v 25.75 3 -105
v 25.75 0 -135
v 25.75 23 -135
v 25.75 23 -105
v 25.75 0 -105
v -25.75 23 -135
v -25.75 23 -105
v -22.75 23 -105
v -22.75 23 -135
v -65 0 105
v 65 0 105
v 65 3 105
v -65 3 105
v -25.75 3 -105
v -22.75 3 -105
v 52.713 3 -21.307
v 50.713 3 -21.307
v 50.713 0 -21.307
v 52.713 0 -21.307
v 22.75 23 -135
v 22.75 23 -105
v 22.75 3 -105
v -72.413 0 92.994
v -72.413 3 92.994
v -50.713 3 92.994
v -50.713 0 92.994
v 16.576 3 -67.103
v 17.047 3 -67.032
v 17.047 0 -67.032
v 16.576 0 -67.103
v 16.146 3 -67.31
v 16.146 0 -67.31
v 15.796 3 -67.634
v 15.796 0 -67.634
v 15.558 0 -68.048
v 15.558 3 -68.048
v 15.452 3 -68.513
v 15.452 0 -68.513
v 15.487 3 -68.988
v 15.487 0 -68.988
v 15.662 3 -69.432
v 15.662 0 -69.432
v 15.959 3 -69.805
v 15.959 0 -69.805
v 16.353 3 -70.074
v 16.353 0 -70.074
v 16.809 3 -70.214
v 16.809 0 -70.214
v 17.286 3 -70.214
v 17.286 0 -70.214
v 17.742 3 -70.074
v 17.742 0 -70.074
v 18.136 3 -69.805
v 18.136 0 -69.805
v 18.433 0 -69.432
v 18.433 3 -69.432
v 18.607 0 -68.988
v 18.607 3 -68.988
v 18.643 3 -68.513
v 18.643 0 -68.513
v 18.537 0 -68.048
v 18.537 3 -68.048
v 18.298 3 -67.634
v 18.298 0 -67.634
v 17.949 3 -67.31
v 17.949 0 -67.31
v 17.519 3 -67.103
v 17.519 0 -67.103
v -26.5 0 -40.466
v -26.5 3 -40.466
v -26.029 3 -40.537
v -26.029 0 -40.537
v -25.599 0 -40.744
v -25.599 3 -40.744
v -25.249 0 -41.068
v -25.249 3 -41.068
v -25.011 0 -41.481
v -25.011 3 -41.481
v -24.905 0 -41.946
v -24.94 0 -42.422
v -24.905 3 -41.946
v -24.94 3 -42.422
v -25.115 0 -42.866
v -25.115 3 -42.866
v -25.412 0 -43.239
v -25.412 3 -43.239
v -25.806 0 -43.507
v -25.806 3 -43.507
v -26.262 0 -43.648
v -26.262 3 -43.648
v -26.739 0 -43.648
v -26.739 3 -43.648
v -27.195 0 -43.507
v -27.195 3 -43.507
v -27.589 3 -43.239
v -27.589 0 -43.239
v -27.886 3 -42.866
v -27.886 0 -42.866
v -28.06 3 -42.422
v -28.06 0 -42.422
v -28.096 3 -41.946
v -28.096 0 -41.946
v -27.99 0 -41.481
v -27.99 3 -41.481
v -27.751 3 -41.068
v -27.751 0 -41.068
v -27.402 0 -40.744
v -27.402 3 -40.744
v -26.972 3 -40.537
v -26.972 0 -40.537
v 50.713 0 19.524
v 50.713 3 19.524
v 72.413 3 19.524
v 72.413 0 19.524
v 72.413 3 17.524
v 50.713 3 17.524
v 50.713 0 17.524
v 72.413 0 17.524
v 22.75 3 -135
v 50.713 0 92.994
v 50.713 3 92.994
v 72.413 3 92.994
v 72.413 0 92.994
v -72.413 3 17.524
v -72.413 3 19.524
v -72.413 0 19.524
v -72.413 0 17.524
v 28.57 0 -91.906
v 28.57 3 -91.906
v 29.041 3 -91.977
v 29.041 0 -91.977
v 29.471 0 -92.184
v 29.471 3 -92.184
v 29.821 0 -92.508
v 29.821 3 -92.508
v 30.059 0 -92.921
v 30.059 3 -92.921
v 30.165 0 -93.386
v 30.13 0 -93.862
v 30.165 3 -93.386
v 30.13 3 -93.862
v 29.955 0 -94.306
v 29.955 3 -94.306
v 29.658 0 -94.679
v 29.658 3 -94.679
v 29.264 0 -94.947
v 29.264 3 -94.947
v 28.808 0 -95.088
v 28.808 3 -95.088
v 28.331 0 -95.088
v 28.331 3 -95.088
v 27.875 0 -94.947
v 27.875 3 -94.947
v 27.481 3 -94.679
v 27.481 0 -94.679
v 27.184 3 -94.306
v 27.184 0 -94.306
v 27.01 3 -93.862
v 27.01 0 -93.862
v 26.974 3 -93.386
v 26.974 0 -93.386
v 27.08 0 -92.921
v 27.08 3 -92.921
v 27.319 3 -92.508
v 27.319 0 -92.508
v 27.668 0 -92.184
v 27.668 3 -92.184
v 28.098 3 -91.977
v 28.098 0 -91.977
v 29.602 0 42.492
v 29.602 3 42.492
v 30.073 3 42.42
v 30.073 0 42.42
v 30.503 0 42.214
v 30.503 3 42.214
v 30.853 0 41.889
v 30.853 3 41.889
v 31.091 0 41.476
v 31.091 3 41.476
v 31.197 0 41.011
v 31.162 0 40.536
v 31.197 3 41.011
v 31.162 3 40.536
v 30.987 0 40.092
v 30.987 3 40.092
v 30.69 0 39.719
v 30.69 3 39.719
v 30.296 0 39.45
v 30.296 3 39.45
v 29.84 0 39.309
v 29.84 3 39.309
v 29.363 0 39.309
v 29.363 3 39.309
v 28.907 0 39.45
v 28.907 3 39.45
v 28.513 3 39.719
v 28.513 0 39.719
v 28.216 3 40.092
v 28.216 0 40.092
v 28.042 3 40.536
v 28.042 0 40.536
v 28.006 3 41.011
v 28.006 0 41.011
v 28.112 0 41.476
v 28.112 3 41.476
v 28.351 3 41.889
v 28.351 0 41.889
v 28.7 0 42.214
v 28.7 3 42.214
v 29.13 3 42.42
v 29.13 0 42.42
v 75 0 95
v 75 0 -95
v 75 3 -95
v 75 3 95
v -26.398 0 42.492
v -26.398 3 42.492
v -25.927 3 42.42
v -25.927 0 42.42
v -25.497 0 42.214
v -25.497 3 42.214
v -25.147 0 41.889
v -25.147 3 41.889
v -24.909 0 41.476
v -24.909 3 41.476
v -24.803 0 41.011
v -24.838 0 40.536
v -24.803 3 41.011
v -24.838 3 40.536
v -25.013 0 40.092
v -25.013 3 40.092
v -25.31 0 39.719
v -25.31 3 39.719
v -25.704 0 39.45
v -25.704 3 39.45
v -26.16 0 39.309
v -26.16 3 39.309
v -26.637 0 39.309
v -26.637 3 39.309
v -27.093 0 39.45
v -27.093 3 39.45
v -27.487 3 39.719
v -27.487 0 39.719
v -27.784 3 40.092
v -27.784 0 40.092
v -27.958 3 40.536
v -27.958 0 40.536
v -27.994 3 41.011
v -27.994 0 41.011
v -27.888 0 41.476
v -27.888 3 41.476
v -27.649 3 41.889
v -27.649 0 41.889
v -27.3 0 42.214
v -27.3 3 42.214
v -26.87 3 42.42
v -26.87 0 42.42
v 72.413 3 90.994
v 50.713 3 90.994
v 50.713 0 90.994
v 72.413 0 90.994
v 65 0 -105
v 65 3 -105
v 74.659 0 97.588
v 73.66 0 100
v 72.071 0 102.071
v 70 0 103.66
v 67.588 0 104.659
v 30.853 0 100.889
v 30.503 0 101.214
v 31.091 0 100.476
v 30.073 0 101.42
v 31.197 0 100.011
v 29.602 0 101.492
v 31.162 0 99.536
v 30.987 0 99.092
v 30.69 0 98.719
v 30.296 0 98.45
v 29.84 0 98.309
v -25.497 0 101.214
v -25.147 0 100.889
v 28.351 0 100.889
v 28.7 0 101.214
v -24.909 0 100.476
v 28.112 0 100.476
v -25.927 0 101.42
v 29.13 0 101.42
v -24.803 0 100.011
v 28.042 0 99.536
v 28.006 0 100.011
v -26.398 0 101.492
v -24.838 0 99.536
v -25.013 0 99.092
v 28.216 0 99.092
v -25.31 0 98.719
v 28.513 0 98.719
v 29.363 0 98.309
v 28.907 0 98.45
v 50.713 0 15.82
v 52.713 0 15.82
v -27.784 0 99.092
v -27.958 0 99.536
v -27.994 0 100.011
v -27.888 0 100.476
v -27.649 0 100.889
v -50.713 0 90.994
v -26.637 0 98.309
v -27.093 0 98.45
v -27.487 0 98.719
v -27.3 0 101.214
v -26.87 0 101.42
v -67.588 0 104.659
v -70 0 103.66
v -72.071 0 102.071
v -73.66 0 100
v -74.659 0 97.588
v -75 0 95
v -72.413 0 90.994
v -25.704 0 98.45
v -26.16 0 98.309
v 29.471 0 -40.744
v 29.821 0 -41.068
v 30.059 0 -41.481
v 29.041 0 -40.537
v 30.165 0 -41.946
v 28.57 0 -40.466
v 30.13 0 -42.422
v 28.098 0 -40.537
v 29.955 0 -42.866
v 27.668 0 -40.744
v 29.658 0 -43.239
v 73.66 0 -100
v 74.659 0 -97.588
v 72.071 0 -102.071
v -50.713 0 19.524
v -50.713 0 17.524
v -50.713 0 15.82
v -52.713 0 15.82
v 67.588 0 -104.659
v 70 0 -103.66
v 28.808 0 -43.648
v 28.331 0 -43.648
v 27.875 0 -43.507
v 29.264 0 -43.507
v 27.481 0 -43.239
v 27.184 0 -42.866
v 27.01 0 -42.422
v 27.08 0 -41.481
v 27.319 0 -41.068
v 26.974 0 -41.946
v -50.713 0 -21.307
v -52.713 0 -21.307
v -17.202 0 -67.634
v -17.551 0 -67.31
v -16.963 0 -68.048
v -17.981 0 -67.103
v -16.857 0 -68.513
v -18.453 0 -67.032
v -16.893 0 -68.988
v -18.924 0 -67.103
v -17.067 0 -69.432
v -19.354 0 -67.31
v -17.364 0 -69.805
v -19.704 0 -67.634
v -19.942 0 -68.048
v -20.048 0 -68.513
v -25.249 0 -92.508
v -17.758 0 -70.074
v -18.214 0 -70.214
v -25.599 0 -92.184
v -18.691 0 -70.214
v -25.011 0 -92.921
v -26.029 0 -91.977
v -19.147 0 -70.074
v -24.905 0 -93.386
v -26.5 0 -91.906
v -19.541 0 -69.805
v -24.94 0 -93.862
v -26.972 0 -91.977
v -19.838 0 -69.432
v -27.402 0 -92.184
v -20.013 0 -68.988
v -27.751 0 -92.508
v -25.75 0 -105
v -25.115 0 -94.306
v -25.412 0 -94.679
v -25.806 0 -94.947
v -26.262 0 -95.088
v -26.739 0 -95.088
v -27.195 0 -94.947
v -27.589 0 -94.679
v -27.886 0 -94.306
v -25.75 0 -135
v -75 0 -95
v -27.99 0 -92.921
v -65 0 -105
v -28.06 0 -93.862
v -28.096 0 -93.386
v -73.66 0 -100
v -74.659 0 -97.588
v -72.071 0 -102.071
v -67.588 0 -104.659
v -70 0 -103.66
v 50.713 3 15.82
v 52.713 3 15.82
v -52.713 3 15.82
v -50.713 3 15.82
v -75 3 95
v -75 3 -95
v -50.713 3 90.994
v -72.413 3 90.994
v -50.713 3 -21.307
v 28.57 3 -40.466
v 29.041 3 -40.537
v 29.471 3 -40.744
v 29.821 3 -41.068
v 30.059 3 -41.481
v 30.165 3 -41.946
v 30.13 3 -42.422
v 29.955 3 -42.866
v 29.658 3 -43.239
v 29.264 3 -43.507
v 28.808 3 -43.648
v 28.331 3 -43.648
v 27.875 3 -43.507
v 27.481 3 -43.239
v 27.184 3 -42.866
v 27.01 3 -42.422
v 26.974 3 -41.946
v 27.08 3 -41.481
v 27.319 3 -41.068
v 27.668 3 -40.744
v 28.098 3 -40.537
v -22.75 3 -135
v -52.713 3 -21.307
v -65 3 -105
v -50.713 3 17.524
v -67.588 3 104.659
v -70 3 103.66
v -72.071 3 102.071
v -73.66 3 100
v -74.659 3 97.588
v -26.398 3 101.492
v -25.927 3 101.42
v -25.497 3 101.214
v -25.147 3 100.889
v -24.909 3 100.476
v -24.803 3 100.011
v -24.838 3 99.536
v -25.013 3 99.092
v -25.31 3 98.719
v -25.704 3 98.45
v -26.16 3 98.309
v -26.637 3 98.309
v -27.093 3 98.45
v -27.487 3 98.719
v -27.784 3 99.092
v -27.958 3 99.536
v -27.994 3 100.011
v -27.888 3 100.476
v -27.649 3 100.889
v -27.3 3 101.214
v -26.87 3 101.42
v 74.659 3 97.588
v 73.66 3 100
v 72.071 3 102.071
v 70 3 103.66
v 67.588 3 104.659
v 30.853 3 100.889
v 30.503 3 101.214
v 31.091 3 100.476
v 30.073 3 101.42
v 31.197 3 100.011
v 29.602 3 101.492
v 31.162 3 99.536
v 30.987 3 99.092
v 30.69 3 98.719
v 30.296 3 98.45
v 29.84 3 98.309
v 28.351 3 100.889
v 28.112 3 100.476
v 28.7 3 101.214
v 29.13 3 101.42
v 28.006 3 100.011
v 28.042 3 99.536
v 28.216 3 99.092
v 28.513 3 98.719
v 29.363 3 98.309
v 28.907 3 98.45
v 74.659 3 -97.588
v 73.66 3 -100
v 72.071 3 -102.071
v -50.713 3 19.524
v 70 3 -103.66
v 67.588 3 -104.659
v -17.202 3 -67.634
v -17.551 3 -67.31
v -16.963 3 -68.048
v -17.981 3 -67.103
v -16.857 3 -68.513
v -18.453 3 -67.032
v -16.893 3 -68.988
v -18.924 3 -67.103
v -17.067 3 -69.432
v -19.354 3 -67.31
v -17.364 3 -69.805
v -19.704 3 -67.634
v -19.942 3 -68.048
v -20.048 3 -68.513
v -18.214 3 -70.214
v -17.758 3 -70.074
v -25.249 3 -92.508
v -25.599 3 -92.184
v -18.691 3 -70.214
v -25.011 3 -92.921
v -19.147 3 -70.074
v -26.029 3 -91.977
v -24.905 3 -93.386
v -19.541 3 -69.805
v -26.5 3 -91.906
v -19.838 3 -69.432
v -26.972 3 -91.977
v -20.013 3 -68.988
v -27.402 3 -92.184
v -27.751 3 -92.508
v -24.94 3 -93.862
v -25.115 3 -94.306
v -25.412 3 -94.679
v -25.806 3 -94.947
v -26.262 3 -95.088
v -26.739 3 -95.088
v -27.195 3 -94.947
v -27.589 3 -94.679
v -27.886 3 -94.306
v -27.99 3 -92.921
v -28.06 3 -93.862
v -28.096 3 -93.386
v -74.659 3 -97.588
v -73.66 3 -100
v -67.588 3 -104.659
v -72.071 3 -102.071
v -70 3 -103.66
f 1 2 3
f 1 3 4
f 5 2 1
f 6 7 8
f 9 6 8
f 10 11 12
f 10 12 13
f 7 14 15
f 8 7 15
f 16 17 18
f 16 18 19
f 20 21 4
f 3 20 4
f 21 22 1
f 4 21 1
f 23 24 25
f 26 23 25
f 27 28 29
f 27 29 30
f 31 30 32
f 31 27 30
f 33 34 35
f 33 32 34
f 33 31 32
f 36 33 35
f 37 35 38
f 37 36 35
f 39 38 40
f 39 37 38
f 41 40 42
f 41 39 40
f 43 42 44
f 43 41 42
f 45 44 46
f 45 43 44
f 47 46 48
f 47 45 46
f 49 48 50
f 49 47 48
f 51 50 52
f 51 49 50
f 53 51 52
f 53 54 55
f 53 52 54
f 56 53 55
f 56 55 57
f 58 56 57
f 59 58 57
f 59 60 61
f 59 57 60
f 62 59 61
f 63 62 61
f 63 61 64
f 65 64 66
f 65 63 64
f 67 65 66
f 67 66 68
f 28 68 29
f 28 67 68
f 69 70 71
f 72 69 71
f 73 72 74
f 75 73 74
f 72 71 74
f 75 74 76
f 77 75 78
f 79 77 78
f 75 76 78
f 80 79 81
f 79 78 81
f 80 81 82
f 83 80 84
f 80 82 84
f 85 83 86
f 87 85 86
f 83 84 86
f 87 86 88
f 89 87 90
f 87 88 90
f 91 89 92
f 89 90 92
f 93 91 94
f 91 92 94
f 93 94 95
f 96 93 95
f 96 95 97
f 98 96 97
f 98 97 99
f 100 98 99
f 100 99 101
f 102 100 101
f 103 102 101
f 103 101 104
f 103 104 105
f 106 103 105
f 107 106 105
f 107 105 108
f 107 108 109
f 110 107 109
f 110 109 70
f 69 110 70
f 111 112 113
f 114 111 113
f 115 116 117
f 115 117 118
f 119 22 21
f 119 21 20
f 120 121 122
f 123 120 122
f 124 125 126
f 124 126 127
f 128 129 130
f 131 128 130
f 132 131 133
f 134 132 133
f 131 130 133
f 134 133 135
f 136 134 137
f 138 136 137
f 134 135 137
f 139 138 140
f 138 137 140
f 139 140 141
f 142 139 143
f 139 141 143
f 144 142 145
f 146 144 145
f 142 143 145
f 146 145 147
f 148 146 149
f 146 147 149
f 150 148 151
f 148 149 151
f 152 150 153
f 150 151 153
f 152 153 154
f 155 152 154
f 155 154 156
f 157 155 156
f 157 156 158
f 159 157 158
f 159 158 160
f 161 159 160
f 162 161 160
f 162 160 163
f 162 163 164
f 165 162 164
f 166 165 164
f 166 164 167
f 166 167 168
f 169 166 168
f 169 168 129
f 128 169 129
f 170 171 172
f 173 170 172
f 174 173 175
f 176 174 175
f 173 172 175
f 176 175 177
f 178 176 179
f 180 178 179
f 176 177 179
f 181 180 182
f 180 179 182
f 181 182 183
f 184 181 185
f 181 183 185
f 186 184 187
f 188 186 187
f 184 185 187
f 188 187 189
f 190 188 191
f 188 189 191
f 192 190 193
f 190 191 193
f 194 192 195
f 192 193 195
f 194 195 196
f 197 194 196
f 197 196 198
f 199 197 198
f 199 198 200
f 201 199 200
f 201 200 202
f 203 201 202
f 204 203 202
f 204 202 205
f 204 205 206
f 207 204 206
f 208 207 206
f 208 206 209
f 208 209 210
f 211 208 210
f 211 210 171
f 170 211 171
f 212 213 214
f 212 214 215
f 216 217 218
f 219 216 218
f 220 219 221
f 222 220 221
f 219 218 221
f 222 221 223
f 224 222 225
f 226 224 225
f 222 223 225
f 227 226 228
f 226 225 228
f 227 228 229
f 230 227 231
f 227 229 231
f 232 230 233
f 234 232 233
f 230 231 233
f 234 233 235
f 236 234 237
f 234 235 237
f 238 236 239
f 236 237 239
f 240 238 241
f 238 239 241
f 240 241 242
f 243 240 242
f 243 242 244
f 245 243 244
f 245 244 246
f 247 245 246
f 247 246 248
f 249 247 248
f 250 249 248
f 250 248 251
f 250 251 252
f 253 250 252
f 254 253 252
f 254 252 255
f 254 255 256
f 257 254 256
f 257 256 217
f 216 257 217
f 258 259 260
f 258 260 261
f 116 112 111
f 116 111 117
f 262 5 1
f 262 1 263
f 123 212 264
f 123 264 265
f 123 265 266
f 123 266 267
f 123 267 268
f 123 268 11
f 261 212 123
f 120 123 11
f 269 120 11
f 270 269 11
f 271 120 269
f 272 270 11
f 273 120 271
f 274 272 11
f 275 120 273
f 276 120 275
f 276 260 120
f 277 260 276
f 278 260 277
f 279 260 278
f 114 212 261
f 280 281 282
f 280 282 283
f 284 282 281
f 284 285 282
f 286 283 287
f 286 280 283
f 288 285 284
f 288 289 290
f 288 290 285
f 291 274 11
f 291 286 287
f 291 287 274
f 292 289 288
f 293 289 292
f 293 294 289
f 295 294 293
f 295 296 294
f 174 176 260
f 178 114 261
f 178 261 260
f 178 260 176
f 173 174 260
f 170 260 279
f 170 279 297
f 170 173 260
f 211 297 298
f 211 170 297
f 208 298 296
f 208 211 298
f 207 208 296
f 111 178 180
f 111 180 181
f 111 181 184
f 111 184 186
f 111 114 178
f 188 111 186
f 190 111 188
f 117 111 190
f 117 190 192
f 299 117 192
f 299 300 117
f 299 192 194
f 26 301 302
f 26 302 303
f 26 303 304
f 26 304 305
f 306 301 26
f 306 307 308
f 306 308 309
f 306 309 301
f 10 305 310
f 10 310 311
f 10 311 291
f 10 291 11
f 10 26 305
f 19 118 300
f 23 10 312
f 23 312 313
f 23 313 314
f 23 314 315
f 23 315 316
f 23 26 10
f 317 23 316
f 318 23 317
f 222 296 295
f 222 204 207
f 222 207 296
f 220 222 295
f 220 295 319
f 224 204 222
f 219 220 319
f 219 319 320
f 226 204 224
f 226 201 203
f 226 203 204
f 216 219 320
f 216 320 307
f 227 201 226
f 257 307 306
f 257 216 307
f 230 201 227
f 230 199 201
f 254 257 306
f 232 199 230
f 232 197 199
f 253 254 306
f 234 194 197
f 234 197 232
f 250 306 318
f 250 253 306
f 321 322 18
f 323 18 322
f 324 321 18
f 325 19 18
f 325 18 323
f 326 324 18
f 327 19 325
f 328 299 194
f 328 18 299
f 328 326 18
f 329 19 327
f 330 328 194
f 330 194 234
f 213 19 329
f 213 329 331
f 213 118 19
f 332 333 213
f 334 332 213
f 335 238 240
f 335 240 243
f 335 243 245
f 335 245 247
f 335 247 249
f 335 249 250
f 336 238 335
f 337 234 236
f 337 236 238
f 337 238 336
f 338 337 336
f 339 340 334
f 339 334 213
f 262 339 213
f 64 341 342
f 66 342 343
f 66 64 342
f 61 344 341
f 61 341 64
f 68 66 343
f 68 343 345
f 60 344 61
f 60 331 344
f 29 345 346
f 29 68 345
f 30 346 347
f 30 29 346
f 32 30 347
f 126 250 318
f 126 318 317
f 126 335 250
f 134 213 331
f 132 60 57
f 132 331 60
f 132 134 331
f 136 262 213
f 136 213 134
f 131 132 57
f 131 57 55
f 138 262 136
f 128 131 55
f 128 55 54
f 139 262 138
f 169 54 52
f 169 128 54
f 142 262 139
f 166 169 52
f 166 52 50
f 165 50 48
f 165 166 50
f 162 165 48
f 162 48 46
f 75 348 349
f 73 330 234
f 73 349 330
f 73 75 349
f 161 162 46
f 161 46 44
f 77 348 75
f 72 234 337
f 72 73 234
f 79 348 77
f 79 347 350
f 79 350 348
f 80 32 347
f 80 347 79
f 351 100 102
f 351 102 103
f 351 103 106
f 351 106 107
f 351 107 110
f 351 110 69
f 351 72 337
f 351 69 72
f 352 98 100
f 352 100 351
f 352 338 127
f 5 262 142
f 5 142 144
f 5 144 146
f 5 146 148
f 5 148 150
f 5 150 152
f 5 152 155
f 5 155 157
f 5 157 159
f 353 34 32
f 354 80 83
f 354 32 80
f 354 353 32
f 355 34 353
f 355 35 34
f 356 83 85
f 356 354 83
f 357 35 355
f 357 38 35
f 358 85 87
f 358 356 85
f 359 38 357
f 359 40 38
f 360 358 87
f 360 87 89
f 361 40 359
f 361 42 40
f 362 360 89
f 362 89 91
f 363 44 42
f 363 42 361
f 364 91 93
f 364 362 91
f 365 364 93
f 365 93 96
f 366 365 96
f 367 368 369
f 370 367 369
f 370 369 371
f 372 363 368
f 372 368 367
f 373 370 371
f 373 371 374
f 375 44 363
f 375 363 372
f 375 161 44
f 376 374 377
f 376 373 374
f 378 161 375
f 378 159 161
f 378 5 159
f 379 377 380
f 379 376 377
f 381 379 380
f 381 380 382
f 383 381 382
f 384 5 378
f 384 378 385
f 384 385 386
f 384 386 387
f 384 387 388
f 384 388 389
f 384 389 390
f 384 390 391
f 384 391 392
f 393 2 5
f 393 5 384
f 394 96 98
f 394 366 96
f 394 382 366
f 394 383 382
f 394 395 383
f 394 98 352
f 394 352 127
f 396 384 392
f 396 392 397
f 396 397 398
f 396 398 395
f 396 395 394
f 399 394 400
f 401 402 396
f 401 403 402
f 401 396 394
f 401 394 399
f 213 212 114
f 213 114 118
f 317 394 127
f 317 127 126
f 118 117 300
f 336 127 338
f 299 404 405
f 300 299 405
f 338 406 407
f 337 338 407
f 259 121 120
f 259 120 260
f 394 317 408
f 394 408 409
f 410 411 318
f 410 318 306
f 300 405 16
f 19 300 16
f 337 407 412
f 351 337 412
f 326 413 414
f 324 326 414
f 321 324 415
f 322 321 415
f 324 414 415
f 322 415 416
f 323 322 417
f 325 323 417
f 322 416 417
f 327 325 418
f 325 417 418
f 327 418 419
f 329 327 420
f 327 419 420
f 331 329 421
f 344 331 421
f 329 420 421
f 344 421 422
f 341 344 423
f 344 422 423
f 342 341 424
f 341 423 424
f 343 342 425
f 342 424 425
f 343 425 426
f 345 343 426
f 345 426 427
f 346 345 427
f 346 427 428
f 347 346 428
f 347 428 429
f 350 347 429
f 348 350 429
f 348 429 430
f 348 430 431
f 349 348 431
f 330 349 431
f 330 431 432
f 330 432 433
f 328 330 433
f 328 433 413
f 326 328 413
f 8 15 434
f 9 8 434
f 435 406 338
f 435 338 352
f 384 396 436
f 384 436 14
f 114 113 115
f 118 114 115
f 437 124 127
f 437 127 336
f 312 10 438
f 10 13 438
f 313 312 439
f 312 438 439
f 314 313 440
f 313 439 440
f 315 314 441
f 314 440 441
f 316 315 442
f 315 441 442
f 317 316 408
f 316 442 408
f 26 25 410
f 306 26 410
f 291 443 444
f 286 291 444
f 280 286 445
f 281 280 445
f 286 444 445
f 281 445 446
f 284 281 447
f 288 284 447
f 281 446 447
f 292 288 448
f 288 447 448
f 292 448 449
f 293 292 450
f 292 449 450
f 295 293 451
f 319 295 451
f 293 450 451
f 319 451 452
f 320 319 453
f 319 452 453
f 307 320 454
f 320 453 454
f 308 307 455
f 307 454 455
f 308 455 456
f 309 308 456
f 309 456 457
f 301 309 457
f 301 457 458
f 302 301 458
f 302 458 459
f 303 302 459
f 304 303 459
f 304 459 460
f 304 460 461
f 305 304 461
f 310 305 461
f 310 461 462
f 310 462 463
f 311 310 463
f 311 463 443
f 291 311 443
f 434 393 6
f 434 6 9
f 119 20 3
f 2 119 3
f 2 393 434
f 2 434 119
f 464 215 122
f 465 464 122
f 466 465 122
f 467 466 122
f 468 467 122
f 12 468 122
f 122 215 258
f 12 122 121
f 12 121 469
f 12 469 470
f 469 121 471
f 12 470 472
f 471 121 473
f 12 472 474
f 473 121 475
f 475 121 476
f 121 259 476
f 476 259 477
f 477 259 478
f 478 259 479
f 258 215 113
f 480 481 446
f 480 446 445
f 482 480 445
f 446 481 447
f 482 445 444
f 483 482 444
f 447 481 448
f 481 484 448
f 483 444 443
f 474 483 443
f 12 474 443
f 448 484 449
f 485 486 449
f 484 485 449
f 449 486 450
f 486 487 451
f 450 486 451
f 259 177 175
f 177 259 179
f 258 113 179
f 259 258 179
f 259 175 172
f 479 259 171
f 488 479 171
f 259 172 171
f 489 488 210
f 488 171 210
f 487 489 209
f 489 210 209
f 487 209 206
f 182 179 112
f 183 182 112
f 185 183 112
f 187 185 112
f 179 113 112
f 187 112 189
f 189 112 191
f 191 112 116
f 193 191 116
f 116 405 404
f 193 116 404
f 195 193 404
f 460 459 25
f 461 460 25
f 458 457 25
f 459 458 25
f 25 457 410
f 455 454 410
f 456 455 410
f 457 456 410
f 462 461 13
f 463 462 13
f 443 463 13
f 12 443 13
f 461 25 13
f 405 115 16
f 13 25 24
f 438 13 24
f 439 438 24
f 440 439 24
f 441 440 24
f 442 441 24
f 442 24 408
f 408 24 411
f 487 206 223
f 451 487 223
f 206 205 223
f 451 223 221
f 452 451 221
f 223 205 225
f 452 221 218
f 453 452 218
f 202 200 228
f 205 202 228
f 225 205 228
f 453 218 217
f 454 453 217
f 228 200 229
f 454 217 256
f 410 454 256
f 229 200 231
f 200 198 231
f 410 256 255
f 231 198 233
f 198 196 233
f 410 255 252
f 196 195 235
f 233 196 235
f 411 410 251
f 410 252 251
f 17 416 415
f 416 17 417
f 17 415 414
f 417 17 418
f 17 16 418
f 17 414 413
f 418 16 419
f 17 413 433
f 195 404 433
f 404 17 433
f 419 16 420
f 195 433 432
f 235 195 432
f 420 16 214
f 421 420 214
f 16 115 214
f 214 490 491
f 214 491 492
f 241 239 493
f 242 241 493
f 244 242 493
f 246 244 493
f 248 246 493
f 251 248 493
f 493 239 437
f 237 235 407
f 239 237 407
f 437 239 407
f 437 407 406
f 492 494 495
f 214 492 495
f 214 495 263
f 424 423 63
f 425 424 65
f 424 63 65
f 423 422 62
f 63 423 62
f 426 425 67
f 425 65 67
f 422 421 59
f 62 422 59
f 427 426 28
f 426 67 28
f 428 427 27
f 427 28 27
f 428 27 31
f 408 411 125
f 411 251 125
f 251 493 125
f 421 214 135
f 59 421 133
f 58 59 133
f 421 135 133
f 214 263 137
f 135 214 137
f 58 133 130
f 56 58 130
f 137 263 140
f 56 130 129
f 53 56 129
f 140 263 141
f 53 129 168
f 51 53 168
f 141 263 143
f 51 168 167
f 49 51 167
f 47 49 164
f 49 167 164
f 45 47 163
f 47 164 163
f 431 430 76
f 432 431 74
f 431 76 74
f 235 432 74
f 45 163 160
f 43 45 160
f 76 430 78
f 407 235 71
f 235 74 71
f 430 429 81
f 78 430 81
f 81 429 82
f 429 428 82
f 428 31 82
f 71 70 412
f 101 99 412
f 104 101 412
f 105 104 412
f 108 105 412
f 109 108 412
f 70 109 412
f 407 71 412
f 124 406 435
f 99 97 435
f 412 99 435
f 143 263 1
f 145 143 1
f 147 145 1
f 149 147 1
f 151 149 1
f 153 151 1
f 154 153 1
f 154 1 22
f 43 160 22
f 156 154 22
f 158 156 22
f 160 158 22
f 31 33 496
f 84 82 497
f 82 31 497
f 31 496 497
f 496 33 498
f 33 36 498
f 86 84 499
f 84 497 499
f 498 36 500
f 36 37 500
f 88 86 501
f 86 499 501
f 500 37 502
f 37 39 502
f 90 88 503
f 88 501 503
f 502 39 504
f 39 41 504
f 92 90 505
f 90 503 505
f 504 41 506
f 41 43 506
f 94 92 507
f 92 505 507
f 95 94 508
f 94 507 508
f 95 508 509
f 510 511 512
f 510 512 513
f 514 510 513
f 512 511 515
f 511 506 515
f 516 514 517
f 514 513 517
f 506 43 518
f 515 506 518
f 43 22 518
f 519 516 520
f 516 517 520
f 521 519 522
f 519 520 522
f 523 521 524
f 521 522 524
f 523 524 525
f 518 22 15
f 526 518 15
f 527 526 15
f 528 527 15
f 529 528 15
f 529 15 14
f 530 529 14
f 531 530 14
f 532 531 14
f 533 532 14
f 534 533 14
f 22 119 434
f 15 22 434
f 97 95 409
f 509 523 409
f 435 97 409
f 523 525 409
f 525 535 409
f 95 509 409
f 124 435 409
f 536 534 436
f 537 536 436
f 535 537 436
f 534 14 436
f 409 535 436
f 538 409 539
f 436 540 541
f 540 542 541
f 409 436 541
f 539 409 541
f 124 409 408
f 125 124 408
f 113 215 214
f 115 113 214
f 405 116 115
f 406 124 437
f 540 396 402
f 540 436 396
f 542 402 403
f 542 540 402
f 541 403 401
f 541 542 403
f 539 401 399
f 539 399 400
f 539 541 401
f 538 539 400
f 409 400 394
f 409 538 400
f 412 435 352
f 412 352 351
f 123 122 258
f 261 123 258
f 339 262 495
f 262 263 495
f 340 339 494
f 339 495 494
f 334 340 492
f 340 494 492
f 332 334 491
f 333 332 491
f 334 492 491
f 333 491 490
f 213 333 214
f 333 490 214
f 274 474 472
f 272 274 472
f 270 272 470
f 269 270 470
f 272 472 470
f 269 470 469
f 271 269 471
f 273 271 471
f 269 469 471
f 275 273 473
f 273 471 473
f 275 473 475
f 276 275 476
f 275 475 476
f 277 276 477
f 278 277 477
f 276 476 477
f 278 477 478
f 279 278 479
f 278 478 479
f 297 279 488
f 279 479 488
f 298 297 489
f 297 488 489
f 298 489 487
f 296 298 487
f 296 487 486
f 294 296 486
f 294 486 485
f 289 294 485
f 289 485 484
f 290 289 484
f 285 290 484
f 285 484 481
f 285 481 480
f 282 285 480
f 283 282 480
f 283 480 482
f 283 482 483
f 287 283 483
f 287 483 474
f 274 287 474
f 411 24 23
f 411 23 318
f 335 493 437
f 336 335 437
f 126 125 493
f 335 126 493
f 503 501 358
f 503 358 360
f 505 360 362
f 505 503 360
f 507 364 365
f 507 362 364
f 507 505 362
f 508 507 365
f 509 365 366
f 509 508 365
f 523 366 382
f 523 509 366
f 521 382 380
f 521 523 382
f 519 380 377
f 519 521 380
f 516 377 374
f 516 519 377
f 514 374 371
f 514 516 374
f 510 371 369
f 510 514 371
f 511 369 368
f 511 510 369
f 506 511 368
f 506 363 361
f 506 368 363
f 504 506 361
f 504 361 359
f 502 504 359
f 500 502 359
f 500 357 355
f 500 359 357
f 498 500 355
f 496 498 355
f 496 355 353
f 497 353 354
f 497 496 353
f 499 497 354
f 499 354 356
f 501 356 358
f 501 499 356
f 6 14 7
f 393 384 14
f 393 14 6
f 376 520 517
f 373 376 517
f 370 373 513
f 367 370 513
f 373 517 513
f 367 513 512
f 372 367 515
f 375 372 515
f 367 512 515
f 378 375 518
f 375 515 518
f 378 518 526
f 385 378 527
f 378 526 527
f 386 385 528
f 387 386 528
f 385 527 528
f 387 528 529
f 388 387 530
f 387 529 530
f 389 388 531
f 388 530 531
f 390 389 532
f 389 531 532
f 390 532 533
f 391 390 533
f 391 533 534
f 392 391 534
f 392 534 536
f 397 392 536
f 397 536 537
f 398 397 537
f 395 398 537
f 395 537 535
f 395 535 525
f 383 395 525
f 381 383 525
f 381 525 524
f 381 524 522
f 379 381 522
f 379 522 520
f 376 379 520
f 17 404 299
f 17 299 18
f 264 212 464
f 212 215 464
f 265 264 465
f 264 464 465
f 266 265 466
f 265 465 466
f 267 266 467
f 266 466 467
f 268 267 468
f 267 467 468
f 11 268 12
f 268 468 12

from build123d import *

# Parameters (mm, degrees)
BOSS_EXTRUDE1_DEPTH     = 3
SKETCH2_R               = 1.6
SKETCH2_W               = 21.700006253
SKETCH2_H               = 2
SKETCH2_W_2             = 2
SKETCH2_H_2             = 37.126830638
CUT_EXTRUDE1_DEPTH      = 155.463587942
SKETCH3_W               = 3
SKETCH3_H               = 30
BOSS_EXTRUDE2_DEPTH     = 20
FILLET2_R               = 10
CUT_EXTRUDE2_DEPTH      = 157.137759687
CUT_EXTRUDE2_DEPTH_BACK = 157.137759687
SKETCH5_R               = 1.6


with BuildPart() as part:
    # Sketch1 → Boss-Extrude1 (new body)
    with BuildSketch(Plane(origin=(0, 0, 0), x_dir=(1, 0, 0), z_dir=(0, 1, 0))):
        Polygon((-75, 105), (-25.75, 105), (-25.75, 135), (25.75, 135), (25.75, 105), (75, 105), (75, -105), (-75, -105), align=None)
    extrude(amount=BOSS_EXTRUDE1_DEPTH)

    # Sketch2 → Cut-Extrude1 (cut, through all)
    with BuildSketch(Plane(origin=(0, 3, 0), x_dir=(1, 0, 0), z_dir=(0, 1, 0))):
        with Locations(Location((-26.500321166, 93.505677214, 0), (0, 0, 270))):
            Circle(SKETCH2_R)
        with Locations(Location((28.569678834, 93.505677214, 0), (0, 0, 270))):
            Circle(SKETCH2_R)
        with Locations(Location((28.569678834, 42.065677214, 0), (0, 0, 270))):
            Circle(SKETCH2_R)
        with Locations(Location((-26.500321166, 42.065677214, 0), (0, 0, 270))):
            Circle(SKETCH2_R)
        with Locations(Location((-26.398287195, -40.891541183, 0), (0, 0, 270))):
            Circle(SKETCH2_R)
        with Locations(Location((29.601712805, -40.891541183, 0), (0, 0, 270))):
            Circle(SKETCH2_R)
        with Locations(Location((-26.398287195, -99.891541183, 0), (0, 0, 270))):
            Circle(SKETCH2_R)
        with Locations(Location((29.601712805, -99.891541183, 0), (0, 0, 270))):
            Circle(SKETCH2_R)
        with Locations((61.56254881, -18.52352323)):
            Rectangle(SKETCH2_W, SKETCH2_H)
        with Locations((-61.56254881, -18.52352323)):
            Rectangle(SKETCH2_W, SKETCH2_H)
        with Locations((51.712545683, 2.74325537)):
            Rectangle(SKETCH2_W_2, SKETCH2_H_2)
        with Locations((-51.712545683, 2.74325537)):
            Rectangle(SKETCH2_W_2, SKETCH2_H_2)
        with Locations((61.56254881, -91.993921103)):
            Rectangle(SKETCH2_W, SKETCH2_H)
        with Locations((-61.56254881, -91.993921103)):
            Rectangle(SKETCH2_W, SKETCH2_H)
    extrude(amount=-CUT_EXTRUDE1_DEPTH, mode=Mode.SUBTRACT)

    # Sketch3 → Boss-Extrude2 (add)
    with BuildSketch(Plane(origin=(0, 3, 0), x_dir=(1, 0, 0), z_dir=(0, 1, 0))):
        with Locations((-24.25, 120)):
            Rectangle(SKETCH3_W, SKETCH3_H)
        with Locations((24.25, 120)):
            Rectangle(SKETCH3_W, SKETCH3_H)
    extrude(amount=BOSS_EXTRUDE2_DEPTH)

    # Fillet2
    fillet2_edges = [part.edges().sort_by_distance(p)[0] for p in [
        (75, 1.5, 105),
        (-75, 1.5, 105),
        (-75, 1.5, -105),
        (75, 1.5, -105),
    ]]
    fillet(fillet2_edges, radius=FILLET2_R)

    # Sketch5 → Cut-Extrude2 (cut, two sides: drawn at the far end of the back side and taken through both)
    with BuildSketch(Plane.XZ.offset(-CUT_EXTRUDE2_DEPTH_BACK)):
        with Locations(Location((-18.452668306, -68.632073291, 0), (0, 0, 90))):
            Circle(SKETCH5_R)
        with Locations(Location((17.047331694, -68.632073291, 0), (0, 0, 90))):
            Circle(SKETCH5_R)
    extrude(amount=CUT_EXTRUDE2_DEPTH + CUT_EXTRUDE2_DEPTH_BACK, mode=Mode.SUBTRACT)


solid = part.part
